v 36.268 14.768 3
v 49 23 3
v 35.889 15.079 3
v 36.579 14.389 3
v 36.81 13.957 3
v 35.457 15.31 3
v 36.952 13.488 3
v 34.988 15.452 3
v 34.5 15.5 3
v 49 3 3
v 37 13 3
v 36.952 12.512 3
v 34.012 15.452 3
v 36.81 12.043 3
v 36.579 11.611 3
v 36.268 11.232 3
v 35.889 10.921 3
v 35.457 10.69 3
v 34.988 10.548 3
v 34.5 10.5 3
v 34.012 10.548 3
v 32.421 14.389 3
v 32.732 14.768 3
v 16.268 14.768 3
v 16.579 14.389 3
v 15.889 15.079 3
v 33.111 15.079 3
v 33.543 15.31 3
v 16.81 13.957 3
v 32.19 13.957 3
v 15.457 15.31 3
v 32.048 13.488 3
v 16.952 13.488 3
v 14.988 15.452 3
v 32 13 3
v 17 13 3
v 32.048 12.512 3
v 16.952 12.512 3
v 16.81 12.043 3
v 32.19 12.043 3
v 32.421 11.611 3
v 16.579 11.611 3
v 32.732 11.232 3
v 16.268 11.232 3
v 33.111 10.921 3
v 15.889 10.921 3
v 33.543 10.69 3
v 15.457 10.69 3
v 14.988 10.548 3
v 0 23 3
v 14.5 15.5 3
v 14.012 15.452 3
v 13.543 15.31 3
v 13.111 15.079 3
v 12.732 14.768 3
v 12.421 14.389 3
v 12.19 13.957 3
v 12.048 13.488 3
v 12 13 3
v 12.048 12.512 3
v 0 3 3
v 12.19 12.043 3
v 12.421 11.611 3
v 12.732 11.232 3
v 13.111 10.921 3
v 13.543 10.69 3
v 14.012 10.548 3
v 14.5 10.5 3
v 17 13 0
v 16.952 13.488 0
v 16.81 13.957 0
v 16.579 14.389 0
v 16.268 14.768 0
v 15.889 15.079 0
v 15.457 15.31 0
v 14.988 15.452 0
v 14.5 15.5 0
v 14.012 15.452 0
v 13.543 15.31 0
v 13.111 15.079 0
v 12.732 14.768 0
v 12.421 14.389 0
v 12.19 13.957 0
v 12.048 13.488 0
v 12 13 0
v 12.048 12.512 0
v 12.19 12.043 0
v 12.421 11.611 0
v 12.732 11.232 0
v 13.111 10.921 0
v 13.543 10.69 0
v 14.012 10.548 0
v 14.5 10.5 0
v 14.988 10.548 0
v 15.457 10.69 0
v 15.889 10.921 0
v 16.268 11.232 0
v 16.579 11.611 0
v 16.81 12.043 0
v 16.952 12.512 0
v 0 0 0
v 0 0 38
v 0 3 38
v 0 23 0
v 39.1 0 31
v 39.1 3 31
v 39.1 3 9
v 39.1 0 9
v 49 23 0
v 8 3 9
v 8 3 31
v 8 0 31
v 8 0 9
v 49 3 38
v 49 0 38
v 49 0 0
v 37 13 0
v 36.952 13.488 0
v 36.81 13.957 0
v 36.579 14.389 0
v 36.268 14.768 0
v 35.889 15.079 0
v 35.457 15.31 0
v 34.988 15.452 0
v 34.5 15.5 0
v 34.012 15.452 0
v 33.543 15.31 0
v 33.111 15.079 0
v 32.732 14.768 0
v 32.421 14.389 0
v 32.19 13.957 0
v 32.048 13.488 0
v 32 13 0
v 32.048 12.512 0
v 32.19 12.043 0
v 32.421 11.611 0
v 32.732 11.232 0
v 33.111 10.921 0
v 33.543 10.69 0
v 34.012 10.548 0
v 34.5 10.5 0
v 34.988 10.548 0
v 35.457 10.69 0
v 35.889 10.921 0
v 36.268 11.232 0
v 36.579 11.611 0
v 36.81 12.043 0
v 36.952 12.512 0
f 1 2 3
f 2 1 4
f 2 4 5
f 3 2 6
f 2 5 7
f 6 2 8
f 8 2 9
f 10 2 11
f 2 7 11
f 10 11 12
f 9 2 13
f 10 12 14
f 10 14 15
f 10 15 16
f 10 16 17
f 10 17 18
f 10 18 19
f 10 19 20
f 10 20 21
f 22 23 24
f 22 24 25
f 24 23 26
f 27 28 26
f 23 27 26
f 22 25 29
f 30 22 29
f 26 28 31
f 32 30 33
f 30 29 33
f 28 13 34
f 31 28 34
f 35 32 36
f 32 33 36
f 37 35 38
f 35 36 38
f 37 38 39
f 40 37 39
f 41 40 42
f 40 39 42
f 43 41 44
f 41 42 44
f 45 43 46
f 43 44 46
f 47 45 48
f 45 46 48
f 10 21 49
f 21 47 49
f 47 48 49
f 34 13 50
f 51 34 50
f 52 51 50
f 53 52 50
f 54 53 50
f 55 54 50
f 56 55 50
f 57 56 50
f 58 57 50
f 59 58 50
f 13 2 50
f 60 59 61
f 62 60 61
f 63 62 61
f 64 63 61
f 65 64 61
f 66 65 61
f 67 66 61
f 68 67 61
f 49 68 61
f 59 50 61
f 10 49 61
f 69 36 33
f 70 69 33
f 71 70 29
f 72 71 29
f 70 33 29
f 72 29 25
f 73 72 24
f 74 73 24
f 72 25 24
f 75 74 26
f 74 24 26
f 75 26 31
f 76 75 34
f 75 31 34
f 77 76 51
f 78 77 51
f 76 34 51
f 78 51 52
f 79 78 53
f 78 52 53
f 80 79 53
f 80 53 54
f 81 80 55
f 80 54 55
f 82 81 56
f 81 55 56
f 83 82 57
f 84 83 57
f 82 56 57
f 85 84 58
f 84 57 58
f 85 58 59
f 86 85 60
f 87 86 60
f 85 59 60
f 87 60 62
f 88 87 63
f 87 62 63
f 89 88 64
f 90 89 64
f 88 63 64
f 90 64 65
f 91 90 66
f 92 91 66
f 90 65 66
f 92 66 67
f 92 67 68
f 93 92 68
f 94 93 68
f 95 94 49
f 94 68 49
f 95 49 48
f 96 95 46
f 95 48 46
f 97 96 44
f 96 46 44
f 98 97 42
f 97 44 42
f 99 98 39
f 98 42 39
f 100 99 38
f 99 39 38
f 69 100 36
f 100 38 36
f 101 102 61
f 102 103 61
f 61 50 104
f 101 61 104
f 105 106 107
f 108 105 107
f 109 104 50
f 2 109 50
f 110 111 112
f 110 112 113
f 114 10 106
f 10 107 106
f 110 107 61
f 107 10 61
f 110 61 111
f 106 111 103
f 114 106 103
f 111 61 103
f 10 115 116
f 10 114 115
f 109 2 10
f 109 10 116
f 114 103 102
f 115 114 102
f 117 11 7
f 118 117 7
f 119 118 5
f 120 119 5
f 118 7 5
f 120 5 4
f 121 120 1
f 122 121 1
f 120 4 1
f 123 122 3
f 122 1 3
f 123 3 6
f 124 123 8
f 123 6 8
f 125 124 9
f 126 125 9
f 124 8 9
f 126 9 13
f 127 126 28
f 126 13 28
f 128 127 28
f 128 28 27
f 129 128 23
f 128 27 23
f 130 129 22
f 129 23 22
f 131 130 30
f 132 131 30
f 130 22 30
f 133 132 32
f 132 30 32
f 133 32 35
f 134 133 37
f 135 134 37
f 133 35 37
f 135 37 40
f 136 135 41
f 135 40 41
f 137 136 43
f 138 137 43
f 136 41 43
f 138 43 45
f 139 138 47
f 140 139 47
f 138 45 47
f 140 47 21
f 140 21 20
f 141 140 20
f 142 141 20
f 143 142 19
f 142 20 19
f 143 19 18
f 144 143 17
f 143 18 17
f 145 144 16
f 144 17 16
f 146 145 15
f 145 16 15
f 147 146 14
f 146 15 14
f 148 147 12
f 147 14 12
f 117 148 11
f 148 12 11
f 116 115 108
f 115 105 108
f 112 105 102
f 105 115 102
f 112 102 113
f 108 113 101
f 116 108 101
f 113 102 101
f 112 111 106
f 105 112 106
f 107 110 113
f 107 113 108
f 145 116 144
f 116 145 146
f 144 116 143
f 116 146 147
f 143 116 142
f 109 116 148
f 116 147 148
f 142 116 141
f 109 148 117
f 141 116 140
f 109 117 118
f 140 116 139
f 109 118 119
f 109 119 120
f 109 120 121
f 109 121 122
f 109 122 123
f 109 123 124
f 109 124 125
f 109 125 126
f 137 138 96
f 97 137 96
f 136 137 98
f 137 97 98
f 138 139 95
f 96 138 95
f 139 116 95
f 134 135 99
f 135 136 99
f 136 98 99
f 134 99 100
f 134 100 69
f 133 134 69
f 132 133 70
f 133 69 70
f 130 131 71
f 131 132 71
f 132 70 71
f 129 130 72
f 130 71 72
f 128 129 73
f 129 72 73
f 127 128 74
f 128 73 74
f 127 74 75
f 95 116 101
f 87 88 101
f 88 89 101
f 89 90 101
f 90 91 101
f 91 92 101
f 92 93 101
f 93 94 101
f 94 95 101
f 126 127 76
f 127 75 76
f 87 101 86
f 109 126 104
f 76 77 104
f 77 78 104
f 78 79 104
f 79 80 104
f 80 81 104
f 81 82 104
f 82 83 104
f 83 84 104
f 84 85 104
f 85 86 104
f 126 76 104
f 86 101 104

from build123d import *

# Parameters (mm, degrees)
BOSS_EXTRUDE1_DEPTH = 49
SKETCH7_W           = 31.1
SKETCH7_H           = 22
CUT_EXTRUDE5_DEPTH  = 3
SKETCH8_R           = 2.5
CUT_EXTRUDE6_DEPTH  = 3


with BuildPart() as part:
    # Sketch1 → Boss-Extrude1 (new body)
    with BuildSketch(Plane(origin=(0, 0, 0), x_dir=(0, 0, -1), z_dir=(1, 0, 0))):
        Polygon((-38, 0), (0, 0), (0, 23), (-3, 23), (-3, 3), (-38, 3), align=None)
    extrude(amount=BOSS_EXTRUDE1_DEPTH)

    # Sketch7 → Cut-Extrude5 (cut)
    with BuildSketch(Plane(origin=(0, 3, 0), x_dir=(1, 0, 0), z_dir=(0, 1, 0))):
        with Locations((23.55, -20)):
            Rectangle(SKETCH7_W, SKETCH7_H)
    extrude(amount=-CUT_EXTRUDE5_DEPTH, mode=Mode.SUBTRACT)

    # Sketch8 → Cut-Extrude6 (cut)
    with BuildSketch(Plane.XY.offset(3)):
        with Locations((14.5, 13)):
            Circle(SKETCH8_R)
        with Locations((34.5, 13)):
            Circle(SKETCH8_R)
    extrude(amount=-CUT_EXTRUDE6_DEPTH, mode=Mode.SUBTRACT)


solid = part.part
